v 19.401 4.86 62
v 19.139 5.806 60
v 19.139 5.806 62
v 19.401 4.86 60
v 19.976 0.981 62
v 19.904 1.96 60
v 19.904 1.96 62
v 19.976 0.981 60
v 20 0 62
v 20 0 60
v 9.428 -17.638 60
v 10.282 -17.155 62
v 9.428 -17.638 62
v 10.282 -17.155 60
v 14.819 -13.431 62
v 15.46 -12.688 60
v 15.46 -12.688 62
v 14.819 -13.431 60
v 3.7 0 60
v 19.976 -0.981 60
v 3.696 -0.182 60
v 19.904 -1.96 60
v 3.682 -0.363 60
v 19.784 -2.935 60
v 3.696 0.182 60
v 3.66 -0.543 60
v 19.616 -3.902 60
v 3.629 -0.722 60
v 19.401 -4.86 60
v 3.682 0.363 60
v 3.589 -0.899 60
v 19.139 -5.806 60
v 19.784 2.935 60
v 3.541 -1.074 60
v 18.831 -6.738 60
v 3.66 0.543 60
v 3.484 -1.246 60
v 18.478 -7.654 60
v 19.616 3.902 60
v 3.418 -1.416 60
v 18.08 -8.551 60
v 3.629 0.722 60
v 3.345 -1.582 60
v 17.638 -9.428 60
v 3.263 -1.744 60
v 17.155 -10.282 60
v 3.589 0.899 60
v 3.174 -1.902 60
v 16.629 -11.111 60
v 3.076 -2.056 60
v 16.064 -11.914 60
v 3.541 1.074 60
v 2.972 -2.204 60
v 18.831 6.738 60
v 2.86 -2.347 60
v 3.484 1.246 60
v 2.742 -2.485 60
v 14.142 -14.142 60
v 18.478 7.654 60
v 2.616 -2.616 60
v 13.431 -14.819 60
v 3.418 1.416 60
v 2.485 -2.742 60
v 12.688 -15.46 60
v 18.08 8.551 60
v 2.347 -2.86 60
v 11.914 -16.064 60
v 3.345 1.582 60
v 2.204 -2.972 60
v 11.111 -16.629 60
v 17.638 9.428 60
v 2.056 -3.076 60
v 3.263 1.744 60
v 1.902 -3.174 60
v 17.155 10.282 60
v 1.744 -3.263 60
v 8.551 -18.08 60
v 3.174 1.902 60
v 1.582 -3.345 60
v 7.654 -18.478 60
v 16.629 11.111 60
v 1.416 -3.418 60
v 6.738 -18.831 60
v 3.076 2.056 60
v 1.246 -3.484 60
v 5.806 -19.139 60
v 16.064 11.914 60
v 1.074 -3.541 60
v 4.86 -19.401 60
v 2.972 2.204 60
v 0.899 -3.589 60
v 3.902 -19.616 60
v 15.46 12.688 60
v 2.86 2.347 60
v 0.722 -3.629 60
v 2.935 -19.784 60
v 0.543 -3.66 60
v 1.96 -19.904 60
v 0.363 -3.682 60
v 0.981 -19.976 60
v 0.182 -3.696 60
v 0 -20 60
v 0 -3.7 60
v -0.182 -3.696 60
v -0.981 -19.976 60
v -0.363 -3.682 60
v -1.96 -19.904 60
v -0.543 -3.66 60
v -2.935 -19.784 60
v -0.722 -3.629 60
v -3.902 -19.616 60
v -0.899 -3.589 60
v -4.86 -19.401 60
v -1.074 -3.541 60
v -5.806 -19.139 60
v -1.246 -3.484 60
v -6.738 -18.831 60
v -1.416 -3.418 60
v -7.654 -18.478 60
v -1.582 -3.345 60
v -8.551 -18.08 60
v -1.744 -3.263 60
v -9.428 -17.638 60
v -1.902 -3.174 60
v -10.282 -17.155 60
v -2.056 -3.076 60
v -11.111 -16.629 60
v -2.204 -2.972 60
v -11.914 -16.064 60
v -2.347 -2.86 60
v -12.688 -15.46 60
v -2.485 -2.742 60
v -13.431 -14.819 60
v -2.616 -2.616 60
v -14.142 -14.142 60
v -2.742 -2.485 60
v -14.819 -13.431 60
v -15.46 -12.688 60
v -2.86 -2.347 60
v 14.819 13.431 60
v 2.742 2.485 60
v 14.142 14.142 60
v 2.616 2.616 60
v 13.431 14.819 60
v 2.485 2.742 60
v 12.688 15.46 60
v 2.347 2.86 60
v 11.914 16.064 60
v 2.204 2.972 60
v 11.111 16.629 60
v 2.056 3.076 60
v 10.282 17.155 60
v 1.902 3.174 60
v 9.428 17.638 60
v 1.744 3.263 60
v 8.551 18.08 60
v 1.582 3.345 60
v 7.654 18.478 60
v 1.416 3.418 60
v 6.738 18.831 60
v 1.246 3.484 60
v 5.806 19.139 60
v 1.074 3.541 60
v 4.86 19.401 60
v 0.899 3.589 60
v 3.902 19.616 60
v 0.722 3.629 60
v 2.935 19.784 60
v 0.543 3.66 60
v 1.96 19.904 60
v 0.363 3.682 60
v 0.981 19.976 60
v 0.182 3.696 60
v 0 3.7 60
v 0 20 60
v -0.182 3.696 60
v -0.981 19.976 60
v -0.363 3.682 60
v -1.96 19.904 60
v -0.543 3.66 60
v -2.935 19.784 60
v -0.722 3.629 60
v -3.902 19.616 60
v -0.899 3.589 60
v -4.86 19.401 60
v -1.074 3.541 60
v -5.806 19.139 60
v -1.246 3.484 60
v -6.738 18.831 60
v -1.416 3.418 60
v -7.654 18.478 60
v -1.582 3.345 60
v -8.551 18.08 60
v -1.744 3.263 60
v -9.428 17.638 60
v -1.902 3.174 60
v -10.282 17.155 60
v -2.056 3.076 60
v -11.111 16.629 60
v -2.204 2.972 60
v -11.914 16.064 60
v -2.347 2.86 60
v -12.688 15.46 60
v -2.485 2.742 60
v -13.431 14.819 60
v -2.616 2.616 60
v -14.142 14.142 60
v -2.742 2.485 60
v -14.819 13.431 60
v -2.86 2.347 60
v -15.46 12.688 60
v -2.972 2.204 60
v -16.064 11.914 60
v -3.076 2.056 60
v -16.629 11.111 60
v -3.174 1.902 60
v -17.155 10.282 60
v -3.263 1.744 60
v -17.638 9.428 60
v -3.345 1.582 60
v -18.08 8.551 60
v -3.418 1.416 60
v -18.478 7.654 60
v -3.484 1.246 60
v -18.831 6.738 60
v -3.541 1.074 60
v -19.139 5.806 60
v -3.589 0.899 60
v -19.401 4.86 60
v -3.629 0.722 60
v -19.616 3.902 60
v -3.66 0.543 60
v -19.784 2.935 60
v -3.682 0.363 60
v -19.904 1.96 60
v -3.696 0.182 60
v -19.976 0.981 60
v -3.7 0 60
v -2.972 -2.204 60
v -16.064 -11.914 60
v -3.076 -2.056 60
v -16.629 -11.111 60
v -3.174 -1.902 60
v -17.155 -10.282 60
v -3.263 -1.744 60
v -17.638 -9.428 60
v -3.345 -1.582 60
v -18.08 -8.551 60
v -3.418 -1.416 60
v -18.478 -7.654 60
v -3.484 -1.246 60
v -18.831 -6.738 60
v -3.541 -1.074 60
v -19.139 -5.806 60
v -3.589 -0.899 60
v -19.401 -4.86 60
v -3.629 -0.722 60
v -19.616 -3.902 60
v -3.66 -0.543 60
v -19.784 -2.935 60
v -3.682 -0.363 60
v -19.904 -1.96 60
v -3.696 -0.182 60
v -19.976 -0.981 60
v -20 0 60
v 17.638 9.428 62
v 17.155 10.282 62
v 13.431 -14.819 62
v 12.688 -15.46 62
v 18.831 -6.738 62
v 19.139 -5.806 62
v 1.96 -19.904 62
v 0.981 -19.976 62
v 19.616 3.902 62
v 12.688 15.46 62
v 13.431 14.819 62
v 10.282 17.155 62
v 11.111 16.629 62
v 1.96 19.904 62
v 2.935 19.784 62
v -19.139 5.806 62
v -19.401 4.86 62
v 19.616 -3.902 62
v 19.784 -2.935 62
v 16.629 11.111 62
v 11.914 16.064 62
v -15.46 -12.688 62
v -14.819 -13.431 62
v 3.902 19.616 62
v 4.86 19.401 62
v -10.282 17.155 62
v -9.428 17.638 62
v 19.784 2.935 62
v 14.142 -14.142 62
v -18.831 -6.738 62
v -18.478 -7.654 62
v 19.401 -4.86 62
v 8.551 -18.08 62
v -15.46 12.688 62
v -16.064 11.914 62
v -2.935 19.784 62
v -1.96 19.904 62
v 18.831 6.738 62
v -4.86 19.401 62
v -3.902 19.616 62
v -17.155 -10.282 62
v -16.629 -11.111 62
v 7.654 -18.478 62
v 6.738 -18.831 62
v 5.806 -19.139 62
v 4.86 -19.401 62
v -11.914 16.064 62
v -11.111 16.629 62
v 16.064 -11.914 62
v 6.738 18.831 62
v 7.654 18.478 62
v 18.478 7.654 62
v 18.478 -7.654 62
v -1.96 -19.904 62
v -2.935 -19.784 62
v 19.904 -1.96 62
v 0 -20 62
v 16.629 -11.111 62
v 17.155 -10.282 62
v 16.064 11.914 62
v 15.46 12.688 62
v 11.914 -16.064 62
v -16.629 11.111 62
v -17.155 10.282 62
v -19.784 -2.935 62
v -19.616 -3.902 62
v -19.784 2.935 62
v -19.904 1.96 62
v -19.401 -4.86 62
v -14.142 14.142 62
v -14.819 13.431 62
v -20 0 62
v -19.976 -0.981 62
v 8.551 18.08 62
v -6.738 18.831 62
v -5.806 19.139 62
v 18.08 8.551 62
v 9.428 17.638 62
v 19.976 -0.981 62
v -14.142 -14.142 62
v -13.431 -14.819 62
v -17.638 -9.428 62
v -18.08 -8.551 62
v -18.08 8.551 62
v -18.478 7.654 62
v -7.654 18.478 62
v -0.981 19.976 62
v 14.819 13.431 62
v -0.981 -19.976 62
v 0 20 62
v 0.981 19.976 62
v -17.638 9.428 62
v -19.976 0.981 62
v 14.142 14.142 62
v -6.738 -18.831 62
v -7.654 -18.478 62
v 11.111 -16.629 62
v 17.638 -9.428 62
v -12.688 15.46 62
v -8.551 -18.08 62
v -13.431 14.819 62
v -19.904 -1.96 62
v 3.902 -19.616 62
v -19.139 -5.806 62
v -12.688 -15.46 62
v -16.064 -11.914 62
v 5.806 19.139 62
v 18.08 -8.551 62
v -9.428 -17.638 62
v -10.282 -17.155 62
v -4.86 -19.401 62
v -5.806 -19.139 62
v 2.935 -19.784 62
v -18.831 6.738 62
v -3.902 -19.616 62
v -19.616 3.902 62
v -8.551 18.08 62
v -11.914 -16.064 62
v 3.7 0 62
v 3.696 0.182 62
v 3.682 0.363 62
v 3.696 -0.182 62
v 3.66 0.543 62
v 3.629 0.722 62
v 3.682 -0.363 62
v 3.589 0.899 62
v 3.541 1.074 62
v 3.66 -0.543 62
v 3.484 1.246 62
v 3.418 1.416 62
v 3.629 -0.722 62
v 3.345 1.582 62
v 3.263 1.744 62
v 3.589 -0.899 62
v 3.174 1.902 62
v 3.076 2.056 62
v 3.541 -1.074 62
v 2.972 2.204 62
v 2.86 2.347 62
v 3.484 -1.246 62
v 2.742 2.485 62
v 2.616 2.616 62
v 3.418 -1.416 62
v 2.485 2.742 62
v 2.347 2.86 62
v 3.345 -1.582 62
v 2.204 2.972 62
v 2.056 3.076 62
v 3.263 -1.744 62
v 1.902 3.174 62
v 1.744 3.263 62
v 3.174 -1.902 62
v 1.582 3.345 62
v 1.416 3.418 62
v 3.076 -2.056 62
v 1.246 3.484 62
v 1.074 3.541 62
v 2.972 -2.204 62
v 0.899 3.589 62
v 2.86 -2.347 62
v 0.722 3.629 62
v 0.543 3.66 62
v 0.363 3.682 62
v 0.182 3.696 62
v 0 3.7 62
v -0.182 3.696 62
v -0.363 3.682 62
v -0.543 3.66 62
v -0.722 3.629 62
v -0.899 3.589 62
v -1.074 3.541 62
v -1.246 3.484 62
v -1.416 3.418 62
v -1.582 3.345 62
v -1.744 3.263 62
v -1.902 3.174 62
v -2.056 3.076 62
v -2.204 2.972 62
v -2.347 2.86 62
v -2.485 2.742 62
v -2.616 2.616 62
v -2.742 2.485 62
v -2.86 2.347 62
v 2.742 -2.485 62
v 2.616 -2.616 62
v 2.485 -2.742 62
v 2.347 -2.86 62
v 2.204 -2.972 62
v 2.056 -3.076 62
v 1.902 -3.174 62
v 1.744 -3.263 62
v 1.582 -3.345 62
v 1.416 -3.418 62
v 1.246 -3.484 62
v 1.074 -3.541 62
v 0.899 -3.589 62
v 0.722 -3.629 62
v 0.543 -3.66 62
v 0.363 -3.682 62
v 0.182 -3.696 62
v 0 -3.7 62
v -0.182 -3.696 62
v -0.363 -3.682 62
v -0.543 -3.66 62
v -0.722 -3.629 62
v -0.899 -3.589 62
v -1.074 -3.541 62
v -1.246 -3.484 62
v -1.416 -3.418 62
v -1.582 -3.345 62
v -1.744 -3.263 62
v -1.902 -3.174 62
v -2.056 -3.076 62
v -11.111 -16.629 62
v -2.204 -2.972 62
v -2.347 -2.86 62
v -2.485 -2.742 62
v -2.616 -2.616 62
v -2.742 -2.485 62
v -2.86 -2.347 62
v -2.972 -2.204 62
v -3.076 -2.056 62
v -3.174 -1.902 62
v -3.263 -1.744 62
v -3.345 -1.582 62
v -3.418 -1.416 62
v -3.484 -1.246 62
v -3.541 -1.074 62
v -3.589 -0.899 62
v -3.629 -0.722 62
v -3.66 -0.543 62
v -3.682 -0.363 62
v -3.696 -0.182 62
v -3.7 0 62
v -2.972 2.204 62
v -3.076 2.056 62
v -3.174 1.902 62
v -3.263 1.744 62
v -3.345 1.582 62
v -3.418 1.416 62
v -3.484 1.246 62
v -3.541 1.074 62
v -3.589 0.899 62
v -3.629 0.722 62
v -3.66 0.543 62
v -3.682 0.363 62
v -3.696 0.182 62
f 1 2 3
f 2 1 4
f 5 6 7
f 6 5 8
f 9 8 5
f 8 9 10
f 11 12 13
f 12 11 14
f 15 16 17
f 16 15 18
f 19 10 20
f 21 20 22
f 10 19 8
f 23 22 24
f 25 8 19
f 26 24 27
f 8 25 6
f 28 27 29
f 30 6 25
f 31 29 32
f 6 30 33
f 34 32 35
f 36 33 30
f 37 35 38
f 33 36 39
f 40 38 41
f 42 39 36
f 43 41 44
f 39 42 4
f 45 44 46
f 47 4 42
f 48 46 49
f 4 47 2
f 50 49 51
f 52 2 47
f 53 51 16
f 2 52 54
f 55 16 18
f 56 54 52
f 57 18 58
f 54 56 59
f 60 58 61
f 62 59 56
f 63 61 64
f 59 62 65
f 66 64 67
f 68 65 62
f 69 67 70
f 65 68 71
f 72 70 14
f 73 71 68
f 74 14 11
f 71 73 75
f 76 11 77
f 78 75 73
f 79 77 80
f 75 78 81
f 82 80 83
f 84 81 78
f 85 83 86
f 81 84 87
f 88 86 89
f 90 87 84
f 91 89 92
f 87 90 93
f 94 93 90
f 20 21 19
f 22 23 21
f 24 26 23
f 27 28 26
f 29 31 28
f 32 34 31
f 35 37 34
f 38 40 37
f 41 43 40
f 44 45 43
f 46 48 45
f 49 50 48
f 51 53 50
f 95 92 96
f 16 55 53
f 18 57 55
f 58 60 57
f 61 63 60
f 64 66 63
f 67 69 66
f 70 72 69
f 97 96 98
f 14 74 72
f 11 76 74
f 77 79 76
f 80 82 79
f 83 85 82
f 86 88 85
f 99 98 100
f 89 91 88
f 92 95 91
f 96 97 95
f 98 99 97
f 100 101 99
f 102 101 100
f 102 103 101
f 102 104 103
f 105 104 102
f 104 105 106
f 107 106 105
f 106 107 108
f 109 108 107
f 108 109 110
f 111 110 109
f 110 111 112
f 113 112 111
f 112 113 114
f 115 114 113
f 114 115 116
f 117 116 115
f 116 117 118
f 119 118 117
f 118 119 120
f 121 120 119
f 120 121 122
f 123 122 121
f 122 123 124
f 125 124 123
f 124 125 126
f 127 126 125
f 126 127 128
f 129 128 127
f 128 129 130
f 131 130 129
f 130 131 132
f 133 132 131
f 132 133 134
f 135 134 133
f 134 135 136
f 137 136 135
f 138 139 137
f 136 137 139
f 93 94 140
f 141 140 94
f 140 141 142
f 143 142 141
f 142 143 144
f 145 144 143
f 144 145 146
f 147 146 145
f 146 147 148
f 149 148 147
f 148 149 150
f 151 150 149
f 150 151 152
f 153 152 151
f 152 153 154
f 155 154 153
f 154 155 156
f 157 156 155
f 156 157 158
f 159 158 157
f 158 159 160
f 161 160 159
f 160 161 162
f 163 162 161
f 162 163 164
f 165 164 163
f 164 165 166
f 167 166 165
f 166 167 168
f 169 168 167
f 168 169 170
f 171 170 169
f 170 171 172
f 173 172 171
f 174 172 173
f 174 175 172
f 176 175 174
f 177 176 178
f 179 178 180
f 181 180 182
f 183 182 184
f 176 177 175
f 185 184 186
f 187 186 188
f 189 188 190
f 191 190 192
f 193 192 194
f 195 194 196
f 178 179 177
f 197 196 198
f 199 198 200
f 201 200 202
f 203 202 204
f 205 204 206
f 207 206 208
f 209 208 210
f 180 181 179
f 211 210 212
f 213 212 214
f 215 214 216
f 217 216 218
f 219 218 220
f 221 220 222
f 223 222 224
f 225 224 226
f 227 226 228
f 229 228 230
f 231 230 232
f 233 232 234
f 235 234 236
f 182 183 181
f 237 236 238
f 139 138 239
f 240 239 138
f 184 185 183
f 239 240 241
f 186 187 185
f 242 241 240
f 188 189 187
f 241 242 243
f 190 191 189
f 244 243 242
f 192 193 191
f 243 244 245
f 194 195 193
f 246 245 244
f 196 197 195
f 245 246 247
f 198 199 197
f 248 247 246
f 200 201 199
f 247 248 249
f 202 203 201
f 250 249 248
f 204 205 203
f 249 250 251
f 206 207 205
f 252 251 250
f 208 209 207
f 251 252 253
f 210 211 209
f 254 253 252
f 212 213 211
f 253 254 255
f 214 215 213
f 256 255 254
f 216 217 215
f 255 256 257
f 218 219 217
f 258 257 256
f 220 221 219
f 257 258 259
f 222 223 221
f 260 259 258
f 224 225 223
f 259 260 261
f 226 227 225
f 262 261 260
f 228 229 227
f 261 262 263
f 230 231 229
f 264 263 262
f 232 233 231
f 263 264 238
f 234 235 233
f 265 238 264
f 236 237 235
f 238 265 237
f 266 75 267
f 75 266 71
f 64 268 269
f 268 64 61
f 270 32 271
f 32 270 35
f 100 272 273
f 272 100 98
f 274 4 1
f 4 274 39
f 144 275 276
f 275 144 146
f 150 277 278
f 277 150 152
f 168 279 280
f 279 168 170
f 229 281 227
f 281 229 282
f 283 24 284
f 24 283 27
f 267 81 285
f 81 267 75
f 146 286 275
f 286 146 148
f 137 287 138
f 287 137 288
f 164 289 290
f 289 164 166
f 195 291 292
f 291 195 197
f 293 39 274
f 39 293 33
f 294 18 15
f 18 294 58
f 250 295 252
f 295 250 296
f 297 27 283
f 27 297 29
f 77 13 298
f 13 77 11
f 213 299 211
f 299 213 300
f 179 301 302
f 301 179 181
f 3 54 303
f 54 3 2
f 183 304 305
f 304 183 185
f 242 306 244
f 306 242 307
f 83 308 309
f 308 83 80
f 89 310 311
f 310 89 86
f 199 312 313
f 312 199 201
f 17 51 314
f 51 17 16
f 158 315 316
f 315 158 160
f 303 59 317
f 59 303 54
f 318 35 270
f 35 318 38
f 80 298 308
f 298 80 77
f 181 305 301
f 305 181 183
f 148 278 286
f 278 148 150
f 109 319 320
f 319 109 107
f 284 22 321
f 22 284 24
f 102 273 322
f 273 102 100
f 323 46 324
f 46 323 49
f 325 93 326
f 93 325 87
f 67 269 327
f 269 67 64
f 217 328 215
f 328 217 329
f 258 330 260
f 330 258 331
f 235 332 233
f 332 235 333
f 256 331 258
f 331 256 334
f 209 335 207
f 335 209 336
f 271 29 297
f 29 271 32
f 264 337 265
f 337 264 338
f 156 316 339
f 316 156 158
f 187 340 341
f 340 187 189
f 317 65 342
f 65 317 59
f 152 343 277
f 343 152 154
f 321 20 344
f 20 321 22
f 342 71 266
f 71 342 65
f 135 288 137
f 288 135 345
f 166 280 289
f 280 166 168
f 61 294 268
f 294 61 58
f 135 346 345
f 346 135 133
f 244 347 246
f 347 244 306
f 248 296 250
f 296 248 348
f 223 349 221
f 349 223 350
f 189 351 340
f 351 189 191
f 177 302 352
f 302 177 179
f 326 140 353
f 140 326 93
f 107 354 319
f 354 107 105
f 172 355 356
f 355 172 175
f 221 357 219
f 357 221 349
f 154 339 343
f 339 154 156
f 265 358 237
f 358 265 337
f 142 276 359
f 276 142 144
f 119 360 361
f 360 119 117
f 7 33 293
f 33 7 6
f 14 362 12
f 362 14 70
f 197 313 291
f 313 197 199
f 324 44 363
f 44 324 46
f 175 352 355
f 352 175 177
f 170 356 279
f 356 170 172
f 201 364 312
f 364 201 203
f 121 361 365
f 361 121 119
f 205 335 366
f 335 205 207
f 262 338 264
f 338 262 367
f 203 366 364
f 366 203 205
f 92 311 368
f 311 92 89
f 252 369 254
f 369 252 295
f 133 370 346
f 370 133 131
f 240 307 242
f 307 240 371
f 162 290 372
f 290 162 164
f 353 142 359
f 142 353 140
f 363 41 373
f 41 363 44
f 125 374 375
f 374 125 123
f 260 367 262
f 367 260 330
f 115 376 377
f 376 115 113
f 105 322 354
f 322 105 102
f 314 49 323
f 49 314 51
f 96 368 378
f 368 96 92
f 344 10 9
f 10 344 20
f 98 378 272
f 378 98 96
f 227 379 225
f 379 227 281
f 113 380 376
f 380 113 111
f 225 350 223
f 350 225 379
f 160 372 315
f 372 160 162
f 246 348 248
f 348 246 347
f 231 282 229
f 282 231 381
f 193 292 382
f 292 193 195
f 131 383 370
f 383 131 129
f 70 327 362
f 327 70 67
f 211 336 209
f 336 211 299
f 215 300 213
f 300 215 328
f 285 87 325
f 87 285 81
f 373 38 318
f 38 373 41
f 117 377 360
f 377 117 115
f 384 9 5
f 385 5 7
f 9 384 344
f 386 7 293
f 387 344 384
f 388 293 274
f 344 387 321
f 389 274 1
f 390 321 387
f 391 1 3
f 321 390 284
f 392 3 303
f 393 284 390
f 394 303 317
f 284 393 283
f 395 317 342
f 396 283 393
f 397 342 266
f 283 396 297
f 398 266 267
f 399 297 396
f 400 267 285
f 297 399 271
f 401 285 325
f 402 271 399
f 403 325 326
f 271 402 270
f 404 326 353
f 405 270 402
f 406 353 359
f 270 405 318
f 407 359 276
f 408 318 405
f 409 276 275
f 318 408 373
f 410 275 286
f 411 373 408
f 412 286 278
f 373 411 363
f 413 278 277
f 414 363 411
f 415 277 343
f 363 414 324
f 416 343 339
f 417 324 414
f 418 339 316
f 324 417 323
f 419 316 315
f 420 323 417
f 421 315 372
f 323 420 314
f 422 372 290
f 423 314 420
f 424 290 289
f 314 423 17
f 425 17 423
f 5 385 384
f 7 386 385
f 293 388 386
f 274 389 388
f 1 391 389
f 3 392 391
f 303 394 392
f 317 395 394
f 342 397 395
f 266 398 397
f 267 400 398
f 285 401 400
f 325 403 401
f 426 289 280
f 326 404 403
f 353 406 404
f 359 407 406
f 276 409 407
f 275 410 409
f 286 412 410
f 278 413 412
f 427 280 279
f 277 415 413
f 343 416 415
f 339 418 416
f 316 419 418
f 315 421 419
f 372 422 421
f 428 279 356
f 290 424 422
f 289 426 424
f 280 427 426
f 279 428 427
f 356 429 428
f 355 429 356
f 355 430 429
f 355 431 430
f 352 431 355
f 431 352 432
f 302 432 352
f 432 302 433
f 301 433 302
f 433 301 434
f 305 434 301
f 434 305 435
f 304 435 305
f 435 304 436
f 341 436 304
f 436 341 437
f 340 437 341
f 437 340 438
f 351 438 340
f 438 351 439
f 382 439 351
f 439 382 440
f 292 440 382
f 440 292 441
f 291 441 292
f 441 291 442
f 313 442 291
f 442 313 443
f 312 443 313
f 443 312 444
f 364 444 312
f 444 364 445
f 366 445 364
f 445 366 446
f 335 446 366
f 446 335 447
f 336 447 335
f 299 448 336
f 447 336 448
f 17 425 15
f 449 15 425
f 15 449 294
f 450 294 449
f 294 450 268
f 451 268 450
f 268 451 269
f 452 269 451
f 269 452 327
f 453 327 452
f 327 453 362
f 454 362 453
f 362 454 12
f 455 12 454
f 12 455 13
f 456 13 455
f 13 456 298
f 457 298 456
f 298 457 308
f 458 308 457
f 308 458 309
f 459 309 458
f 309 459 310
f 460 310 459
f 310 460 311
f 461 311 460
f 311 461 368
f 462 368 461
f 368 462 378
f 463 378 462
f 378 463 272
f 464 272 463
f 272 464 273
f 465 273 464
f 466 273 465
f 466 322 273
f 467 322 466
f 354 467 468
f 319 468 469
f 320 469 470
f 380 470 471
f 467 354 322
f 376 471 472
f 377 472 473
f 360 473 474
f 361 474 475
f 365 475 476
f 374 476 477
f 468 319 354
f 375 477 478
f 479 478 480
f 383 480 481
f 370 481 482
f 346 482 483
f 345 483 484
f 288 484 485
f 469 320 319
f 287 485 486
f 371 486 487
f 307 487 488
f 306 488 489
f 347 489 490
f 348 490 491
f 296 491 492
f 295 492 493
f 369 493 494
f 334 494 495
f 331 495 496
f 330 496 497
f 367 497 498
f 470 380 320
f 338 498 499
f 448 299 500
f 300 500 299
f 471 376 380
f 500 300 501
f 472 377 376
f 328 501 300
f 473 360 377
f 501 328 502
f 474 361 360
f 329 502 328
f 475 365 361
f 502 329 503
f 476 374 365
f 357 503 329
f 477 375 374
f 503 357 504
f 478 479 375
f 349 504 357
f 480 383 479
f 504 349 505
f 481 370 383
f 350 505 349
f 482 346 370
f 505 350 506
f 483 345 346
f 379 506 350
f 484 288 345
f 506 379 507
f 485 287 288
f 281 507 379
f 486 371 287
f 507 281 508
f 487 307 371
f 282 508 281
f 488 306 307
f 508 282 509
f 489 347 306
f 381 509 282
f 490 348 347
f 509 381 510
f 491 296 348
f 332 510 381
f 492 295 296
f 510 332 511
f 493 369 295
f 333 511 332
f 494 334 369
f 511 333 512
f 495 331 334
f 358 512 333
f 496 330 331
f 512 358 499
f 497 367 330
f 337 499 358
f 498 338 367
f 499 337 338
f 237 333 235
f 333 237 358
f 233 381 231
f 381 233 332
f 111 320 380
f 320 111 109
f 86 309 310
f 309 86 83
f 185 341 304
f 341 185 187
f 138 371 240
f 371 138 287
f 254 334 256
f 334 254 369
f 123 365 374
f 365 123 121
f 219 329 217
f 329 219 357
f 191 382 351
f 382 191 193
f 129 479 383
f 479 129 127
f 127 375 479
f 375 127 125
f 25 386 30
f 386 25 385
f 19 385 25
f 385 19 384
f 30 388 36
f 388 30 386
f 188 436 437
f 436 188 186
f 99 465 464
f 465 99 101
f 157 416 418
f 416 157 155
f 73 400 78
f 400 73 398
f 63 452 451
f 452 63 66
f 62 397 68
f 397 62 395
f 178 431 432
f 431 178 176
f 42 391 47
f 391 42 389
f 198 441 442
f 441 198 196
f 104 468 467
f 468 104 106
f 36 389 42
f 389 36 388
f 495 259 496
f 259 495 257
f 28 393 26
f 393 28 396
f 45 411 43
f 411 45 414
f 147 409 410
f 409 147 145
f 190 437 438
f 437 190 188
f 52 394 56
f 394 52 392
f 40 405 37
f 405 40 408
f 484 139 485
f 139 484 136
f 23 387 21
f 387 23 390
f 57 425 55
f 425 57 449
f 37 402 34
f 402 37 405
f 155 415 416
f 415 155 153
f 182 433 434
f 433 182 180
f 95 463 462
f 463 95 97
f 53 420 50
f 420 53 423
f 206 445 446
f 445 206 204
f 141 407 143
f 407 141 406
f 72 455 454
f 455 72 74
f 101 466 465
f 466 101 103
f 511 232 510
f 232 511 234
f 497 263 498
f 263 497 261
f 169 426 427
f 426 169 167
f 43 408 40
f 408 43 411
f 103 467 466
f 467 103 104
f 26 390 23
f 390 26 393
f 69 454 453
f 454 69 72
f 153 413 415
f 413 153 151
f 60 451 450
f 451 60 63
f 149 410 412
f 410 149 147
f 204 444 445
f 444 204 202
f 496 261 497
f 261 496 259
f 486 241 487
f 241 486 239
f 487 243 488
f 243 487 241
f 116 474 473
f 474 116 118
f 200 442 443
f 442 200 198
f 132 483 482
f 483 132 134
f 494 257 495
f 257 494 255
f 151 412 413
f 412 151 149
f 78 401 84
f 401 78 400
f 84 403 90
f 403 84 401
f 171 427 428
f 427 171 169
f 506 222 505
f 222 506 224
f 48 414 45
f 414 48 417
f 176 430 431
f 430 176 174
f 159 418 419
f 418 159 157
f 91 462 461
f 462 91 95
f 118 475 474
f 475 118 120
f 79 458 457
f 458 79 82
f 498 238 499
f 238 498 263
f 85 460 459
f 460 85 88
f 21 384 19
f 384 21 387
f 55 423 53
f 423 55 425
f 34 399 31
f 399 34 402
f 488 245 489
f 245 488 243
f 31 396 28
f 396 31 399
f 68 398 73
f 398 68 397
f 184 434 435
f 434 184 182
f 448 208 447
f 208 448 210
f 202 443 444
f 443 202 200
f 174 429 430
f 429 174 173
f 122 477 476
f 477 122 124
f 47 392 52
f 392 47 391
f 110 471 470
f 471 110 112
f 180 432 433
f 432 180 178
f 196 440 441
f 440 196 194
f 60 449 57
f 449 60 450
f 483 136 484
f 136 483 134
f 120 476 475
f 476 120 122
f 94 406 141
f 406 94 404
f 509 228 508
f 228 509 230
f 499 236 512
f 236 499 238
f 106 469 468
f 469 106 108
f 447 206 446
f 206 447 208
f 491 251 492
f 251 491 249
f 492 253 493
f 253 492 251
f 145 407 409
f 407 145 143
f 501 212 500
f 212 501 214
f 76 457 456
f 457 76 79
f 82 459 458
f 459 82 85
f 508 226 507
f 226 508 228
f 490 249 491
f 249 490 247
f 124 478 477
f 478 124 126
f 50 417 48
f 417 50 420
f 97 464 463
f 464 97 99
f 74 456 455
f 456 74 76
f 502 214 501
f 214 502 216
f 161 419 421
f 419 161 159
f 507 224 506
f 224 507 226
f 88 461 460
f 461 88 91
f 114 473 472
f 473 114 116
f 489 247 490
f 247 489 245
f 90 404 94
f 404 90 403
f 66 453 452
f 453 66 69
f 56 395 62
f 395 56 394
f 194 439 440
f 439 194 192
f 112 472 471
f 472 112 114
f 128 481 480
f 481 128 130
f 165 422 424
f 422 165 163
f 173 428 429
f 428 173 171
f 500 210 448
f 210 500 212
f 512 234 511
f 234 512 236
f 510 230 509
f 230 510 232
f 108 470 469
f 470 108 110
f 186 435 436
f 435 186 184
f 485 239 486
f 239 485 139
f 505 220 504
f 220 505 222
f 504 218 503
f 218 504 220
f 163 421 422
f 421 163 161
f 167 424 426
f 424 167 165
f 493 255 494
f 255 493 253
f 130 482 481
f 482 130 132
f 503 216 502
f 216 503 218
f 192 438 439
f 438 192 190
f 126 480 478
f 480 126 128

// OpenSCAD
// file: common_params.scad
cylinder_radius = 20.000000;
cylinder_height = 60.000000;
wall_thickness = 2.000000;

cap_thickness = 2.000000;

rod_radius = 2.000000;
rod_height = 50.000000;

ring_outer_radius = 8.000000;
ring_inner_radius = 4.000000;
ring_thickness = 3.000000;
ring_z = 40.000000;

$fn = 128;
// main file
include <common_params.scad>;

hole_radius = 3.700000;

translate([0, 0, cylinder_height])
difference() {
    cylinder(h = cap_thickness, r = cylinder_radius);
    translate([0, 0, -0.1])
        cylinder(h = cap_thickness + 0.2, r = hole_radius);
}
